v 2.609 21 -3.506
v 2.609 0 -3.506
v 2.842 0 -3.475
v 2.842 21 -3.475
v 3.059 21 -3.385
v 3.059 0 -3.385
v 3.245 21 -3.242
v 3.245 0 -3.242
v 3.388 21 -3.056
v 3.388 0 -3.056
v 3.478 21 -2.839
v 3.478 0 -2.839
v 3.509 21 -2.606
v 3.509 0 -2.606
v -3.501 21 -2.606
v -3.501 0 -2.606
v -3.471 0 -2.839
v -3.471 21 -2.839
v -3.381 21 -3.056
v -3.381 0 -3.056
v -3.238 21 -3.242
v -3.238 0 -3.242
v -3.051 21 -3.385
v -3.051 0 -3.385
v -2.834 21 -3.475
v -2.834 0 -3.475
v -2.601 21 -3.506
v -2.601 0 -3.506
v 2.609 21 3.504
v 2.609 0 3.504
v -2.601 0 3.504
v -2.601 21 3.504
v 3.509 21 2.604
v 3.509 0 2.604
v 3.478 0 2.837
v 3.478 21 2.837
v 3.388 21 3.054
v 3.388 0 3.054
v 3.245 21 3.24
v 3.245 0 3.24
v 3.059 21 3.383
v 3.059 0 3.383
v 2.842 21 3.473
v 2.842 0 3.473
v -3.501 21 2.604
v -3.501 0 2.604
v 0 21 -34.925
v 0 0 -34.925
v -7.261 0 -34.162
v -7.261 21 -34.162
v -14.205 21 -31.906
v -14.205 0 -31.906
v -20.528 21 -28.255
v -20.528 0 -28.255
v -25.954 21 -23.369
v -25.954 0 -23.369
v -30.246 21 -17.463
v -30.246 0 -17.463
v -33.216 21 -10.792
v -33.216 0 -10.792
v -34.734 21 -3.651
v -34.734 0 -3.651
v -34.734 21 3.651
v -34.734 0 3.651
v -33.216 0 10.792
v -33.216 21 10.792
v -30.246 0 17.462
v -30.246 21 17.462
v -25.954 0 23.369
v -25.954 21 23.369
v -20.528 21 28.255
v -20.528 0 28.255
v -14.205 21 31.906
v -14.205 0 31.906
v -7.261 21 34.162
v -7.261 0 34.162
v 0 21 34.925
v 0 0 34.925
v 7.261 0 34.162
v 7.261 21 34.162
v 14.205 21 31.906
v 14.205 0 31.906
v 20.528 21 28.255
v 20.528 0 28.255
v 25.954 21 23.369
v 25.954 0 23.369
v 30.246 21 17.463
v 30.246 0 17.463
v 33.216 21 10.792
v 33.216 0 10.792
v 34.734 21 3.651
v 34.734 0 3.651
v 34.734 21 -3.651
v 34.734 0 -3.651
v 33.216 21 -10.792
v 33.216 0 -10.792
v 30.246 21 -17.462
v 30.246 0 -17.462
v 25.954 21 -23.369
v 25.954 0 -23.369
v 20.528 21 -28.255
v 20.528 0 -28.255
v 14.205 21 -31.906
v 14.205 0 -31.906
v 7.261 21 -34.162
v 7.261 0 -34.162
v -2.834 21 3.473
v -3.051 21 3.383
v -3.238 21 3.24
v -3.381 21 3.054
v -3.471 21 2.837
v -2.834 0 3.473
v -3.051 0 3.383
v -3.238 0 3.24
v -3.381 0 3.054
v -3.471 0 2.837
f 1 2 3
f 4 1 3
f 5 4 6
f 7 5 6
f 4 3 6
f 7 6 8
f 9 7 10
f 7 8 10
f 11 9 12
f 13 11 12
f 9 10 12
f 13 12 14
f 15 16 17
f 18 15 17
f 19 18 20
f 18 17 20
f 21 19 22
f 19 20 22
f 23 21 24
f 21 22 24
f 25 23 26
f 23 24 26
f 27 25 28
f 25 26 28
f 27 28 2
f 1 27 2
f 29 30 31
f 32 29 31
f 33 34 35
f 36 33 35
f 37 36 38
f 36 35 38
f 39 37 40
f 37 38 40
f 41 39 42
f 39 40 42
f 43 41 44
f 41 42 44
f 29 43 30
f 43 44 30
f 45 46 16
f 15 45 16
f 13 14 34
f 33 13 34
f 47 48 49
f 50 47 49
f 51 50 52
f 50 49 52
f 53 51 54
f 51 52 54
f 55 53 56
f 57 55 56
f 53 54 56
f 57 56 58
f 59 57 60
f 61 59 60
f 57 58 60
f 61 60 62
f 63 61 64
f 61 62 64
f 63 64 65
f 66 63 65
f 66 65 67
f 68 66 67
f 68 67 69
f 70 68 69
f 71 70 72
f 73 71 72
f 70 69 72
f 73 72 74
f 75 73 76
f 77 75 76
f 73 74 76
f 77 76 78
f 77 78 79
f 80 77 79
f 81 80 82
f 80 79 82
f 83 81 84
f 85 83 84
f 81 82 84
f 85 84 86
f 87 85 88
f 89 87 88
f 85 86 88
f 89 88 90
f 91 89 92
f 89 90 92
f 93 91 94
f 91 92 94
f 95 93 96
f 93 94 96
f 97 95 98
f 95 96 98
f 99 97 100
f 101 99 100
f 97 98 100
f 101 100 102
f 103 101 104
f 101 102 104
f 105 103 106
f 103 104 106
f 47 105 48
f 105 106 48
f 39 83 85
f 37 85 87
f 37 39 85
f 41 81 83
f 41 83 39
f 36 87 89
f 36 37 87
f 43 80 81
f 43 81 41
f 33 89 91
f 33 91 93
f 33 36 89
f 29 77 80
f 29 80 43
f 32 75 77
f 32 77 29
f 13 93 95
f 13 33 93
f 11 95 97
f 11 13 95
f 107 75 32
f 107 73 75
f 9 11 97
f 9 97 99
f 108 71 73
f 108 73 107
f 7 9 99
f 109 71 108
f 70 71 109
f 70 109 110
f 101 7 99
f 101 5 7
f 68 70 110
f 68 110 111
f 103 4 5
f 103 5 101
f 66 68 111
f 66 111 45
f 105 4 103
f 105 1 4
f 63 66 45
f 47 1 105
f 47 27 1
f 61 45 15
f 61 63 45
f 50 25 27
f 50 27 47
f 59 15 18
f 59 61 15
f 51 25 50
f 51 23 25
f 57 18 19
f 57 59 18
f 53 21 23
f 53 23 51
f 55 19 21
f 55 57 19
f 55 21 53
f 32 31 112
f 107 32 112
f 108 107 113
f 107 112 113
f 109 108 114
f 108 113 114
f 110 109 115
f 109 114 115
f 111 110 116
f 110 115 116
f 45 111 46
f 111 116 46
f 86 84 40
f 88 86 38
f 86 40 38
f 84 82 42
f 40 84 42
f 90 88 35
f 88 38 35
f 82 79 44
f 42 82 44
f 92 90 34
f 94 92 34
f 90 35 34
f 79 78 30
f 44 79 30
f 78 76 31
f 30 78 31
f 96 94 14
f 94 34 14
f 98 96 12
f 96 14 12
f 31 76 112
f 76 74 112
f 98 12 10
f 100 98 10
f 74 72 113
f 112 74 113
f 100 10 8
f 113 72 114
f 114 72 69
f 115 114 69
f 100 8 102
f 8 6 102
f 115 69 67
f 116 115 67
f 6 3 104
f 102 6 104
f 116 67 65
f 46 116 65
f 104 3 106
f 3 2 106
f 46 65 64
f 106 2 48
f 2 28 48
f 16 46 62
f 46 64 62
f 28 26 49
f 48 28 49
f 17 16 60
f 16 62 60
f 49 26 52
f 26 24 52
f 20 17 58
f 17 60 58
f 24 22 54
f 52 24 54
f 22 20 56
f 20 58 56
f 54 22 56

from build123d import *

# Parameters (mm, degrees)
SKETCH_1_R      = 34.925
EXTRUDE_1_DEPTH = 21


with BuildPart() as part:
    # 草图1 → 凸台-拉伸1 (new body)
    with BuildSketch(Plane(origin=(0, 0, 0), x_dir=(1, 0, 0), z_dir=(0, 1, 0))):
        with Locations(Location((0, 0, 0), (0, 0, 90))):
            Circle(SKETCH_1_R)
        with BuildLine():
            Line((-2.601341773, 3.505973477), (2.608658475, 3.505973477))
            ThreePointArc((2.608658475, 3.505973477), (3.245054563, 3.242369587), (3.508658453, 2.605973499))
            Line((3.508658453, 2.605973499), (3.508658453, -2.604026749))
            ThreePointArc((3.508658453, -2.604026749), (3.245054563, -3.240422836), (2.608658475, -3.504026727))
            Line((2.608658475, -3.504026727), (-2.601341773, -3.504026727))
            ThreePointArc((-2.601341773, -3.504026727), (-3.23773786, -3.240422836), (-3.501341751, -2.604026749))
            Line((-3.501341751, -2.604026749), (-3.501341751, 2.605973499))
            ThreePointArc((-3.501341751, 2.605973499), (-3.23773786, 3.242369587), (-2.601341773, 3.505973477))
        make_face(mode=Mode.SUBTRACT)
    extrude(amount=EXTRUDE_1_DEPTH)


solid = part.part
